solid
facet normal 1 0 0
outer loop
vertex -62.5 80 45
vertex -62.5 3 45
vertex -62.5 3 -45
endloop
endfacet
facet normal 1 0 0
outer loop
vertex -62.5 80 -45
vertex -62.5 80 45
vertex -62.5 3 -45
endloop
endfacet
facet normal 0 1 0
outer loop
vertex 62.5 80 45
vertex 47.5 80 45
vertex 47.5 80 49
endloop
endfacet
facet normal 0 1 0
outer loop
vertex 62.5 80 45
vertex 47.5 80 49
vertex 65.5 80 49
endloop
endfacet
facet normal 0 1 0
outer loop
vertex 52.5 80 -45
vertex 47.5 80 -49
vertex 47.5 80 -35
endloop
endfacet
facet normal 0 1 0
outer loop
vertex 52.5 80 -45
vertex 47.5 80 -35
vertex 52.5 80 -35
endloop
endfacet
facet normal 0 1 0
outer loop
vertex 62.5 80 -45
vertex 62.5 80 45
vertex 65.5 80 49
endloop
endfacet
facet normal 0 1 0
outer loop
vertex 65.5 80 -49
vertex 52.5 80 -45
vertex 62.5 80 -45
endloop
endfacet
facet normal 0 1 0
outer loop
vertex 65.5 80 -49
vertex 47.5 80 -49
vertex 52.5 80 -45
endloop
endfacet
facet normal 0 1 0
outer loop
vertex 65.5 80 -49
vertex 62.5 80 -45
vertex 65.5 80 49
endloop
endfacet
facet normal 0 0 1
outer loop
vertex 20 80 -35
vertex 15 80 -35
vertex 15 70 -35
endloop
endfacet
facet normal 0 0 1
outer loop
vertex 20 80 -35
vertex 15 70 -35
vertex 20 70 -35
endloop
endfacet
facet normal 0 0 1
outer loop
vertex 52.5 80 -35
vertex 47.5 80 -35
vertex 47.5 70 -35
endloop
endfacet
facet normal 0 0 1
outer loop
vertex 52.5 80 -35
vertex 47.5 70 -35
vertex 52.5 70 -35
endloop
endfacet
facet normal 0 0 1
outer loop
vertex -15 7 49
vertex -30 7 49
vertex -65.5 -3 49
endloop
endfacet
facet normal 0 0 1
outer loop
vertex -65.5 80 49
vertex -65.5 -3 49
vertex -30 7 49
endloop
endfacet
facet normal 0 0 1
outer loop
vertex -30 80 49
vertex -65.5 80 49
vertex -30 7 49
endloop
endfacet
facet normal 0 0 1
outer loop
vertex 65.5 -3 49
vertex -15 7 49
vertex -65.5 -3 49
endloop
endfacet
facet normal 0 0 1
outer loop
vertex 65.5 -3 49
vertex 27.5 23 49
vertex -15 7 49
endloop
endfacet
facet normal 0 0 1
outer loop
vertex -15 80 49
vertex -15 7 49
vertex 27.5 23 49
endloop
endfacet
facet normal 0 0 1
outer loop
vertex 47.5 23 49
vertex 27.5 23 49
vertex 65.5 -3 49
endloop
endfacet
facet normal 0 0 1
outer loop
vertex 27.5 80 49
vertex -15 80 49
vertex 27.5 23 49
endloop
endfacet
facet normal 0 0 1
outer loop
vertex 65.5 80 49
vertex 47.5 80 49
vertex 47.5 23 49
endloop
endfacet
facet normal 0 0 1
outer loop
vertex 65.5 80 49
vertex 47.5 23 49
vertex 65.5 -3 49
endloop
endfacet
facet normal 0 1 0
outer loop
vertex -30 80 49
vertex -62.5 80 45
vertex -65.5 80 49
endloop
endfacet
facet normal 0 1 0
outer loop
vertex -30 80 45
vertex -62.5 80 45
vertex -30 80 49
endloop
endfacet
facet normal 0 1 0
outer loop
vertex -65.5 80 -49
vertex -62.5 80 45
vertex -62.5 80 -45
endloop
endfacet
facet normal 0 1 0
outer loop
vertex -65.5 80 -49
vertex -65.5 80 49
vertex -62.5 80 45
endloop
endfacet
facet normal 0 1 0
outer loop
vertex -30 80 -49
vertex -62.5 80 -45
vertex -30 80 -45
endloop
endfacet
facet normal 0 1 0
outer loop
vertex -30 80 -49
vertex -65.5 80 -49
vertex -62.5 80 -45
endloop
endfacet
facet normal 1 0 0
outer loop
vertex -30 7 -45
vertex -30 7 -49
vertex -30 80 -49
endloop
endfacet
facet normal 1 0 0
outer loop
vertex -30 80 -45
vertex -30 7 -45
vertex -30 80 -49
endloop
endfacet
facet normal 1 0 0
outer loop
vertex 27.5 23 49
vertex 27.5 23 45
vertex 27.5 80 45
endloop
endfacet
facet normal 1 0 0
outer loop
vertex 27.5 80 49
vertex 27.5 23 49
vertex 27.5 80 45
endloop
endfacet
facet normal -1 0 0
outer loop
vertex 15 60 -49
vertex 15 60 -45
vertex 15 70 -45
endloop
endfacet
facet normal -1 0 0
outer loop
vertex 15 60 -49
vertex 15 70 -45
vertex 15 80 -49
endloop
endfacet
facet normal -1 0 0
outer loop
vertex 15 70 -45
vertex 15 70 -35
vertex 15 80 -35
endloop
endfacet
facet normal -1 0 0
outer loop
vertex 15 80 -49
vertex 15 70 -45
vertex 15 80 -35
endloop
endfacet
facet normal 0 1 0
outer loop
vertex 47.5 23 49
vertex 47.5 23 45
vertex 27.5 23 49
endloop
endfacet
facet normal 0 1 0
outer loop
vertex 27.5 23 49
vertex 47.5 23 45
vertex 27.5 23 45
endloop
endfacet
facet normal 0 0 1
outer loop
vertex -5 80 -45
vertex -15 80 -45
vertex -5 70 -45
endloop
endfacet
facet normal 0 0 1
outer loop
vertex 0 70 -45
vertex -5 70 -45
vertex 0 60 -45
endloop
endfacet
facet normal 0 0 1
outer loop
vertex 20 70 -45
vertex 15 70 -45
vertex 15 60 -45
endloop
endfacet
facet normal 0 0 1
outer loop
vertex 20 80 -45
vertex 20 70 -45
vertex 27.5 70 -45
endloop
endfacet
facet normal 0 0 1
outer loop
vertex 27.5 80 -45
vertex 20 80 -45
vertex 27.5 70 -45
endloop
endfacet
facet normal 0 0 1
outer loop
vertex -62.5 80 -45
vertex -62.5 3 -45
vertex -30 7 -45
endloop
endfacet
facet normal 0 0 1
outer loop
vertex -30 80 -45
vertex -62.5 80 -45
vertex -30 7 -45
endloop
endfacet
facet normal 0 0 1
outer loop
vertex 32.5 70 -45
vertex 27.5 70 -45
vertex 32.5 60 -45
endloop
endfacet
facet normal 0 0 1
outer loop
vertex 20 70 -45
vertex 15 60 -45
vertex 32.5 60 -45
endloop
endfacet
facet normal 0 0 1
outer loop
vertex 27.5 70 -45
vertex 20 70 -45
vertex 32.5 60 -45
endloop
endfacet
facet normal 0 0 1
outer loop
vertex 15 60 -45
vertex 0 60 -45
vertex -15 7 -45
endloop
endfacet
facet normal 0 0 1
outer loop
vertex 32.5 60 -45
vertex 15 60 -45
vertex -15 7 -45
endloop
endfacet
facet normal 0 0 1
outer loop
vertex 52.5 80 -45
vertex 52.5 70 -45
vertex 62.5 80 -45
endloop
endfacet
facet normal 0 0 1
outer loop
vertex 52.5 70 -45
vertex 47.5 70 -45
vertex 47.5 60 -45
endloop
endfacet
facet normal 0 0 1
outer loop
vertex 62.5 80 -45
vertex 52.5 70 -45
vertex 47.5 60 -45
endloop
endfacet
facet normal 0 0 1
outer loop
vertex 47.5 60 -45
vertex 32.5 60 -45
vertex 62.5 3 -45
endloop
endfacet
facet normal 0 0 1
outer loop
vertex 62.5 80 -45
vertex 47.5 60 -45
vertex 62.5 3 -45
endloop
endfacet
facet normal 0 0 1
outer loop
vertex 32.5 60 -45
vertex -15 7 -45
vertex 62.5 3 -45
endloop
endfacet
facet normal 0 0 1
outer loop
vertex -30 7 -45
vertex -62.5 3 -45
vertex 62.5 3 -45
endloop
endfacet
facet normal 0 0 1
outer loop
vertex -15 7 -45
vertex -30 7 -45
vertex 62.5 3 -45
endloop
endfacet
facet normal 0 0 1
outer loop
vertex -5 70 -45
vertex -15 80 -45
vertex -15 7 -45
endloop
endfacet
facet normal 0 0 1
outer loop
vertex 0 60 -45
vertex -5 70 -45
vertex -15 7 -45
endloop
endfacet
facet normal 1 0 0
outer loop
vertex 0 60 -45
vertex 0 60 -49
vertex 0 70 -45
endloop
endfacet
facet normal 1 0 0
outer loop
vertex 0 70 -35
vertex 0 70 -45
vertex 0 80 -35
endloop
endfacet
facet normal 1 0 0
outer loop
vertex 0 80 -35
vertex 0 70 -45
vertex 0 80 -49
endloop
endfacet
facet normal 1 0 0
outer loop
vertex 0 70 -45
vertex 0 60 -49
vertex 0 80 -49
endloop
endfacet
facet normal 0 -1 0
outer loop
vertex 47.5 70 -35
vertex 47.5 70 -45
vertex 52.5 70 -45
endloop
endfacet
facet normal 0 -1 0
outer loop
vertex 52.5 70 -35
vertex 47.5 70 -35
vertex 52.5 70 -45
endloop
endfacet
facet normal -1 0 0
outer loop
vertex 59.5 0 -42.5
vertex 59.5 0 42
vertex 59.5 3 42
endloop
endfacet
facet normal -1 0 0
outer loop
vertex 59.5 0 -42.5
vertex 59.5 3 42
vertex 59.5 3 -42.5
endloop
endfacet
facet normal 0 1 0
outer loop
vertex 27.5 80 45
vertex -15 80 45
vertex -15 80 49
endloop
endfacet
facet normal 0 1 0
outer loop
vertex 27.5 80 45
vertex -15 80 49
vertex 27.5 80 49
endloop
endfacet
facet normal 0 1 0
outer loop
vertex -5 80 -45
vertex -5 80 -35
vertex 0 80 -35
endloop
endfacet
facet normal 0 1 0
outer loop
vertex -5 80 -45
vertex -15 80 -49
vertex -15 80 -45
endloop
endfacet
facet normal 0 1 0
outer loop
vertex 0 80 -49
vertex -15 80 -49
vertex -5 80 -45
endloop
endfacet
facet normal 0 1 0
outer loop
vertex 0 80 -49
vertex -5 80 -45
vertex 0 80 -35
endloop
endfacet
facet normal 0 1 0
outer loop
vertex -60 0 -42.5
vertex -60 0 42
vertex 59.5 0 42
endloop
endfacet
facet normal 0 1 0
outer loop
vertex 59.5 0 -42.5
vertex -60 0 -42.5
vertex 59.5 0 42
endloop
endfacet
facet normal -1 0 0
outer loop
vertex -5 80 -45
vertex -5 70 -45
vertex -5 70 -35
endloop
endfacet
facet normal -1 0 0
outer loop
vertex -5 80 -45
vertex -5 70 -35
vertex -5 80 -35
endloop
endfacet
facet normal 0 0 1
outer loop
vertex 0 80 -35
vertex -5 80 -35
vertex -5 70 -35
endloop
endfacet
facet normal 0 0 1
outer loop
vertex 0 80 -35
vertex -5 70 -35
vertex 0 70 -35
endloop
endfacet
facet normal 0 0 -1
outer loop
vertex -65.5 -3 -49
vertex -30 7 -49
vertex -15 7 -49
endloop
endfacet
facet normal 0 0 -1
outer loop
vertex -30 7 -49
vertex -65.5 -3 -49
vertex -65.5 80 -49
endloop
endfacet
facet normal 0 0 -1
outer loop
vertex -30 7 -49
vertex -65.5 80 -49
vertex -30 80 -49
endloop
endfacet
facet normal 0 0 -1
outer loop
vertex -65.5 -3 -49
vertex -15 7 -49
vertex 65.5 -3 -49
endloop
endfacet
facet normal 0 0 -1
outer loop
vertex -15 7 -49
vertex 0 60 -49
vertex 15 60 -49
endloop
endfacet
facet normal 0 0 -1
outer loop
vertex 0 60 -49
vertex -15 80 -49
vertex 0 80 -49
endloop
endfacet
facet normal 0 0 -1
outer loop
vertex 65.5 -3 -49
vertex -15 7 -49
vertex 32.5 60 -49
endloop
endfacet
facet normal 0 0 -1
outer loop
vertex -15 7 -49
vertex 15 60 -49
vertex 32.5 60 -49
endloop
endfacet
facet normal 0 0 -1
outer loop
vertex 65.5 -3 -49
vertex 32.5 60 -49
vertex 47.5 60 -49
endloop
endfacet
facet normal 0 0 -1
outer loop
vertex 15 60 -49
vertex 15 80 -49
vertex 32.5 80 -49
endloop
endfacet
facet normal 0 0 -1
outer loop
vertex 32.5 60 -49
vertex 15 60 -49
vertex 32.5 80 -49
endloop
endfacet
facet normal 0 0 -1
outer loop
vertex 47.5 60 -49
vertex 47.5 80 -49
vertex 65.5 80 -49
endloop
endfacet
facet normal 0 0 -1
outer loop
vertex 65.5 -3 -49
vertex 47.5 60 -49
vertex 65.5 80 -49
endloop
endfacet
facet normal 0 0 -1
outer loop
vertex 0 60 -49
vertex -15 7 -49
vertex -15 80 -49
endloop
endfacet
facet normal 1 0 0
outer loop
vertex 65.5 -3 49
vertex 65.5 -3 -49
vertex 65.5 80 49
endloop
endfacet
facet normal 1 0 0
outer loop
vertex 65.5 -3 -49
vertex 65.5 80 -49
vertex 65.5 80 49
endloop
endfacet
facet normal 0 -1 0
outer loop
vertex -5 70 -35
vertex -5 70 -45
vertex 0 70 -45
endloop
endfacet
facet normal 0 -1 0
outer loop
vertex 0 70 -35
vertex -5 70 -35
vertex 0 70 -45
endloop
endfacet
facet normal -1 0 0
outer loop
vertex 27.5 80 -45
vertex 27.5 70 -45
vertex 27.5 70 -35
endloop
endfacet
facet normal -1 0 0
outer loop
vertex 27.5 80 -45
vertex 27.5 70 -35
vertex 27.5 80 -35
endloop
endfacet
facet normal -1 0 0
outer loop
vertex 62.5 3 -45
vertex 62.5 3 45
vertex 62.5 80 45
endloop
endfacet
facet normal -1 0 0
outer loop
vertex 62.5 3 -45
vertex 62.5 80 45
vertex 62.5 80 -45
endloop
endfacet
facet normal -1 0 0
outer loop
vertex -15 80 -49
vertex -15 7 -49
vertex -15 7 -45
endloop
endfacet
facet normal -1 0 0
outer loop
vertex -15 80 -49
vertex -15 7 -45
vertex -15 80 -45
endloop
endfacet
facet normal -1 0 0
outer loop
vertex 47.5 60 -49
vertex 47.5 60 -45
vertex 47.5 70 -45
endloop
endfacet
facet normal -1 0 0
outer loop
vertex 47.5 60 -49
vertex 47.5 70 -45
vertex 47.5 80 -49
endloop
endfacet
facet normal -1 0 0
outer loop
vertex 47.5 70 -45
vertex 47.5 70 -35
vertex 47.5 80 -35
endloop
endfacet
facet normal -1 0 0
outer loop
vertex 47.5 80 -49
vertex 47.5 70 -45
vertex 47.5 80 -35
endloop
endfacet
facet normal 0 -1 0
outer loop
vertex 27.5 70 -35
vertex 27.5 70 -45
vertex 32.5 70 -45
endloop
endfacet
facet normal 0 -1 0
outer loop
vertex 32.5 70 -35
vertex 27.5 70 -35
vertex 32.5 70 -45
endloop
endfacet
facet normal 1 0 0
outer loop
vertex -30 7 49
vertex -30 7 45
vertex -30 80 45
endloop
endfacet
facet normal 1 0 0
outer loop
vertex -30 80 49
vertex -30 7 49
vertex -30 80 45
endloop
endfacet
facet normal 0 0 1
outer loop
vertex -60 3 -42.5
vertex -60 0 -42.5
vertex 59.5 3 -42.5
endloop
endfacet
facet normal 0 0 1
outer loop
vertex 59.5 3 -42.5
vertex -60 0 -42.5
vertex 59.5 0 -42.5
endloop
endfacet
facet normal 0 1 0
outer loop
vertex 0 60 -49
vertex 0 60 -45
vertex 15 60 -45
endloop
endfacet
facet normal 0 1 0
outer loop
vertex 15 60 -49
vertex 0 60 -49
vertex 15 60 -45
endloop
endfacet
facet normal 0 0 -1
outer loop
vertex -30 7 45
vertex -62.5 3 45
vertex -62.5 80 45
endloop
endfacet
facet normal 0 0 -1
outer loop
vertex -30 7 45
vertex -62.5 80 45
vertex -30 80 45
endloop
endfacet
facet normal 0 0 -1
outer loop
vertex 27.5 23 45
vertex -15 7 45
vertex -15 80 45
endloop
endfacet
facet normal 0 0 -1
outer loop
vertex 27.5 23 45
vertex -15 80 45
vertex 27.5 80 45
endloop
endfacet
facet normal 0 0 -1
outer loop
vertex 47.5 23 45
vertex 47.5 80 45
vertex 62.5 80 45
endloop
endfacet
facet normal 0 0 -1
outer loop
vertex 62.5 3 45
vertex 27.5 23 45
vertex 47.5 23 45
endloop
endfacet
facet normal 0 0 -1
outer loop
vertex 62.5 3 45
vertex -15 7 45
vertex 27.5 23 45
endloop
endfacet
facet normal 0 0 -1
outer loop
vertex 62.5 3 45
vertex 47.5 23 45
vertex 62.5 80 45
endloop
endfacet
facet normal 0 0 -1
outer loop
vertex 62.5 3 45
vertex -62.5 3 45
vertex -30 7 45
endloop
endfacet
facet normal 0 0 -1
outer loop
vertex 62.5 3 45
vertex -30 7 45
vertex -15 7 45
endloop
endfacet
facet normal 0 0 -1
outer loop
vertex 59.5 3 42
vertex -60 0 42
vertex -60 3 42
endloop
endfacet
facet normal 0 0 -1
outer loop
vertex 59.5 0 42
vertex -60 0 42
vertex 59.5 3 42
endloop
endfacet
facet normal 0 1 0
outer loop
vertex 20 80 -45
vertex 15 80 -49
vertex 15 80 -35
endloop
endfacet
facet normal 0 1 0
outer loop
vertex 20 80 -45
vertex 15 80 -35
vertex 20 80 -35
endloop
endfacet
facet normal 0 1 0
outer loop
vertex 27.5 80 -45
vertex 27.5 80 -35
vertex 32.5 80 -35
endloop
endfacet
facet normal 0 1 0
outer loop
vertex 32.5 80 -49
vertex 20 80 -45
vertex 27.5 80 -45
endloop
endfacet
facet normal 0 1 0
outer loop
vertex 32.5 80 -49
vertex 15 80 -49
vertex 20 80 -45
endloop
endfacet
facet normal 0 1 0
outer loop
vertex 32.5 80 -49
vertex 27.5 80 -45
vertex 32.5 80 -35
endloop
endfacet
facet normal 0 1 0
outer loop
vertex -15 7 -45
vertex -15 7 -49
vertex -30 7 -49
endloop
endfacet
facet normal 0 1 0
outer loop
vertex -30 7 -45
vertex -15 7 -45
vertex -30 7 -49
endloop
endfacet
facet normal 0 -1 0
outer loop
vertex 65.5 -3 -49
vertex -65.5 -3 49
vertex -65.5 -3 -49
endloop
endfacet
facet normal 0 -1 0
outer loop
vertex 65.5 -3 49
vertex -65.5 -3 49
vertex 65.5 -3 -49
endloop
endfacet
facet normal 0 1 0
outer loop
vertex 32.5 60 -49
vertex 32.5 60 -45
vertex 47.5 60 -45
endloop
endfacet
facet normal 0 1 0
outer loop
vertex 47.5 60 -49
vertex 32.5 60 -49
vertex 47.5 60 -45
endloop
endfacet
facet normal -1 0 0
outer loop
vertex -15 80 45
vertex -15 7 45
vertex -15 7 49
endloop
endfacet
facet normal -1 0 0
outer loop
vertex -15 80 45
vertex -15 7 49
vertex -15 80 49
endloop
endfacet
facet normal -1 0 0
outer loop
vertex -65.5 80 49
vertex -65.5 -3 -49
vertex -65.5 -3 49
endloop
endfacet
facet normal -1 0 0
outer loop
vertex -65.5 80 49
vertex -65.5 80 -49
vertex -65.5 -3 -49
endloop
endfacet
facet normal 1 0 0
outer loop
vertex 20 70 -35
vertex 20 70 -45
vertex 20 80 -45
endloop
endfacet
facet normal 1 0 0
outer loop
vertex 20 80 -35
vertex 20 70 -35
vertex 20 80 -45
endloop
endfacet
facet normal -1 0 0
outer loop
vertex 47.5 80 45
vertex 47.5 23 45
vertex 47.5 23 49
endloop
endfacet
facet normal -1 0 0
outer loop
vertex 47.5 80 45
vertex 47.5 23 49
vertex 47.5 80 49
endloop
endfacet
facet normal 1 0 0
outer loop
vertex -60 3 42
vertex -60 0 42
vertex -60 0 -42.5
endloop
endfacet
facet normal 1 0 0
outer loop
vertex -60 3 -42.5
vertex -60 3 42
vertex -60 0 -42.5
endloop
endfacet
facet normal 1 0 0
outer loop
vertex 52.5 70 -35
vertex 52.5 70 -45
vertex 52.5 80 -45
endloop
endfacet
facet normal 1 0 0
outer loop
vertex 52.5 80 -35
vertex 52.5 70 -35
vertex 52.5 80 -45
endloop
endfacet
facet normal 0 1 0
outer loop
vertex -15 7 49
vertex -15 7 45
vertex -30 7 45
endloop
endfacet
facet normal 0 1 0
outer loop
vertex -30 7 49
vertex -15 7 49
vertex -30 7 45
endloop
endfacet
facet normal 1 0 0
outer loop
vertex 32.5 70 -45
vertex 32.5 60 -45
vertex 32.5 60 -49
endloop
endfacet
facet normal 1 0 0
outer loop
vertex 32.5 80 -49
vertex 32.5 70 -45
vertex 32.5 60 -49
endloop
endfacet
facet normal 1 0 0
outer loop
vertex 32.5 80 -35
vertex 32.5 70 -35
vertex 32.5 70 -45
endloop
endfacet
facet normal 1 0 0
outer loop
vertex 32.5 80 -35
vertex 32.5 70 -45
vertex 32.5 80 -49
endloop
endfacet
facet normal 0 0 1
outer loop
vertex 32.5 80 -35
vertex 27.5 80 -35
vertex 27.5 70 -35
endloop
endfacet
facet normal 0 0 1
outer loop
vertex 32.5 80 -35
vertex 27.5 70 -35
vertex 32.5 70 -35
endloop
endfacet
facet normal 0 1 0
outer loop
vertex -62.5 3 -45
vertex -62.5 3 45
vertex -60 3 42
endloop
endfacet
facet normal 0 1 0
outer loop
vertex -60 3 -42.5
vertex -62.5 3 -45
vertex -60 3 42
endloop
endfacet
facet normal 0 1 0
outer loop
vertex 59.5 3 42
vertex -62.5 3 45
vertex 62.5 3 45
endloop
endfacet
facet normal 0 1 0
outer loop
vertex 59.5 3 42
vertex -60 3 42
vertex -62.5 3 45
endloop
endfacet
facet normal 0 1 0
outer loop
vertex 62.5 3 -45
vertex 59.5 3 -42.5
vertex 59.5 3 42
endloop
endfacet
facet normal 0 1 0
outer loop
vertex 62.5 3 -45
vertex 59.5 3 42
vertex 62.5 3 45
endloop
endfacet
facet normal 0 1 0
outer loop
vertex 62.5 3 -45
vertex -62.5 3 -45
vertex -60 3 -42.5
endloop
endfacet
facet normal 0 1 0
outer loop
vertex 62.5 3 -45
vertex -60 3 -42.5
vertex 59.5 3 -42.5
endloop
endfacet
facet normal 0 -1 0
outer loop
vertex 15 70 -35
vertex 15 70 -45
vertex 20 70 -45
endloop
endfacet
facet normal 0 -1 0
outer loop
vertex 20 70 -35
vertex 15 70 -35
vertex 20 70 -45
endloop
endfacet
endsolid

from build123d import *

# Parameters (mm, degrees)
SKETCH1_W           = 131
SKETCH1_H           = 98
SKETCH1_W_2         = 125
SKETCH1_H_2         = 90
BOSS_EXTRUDE1_DEPTH = 80
SKETCH2_W           = 131
SKETCH2_H           = 98
BOSS_EXTRUDE2_DEPTH = 3
SKETCH4_W           = 125
SKETCH4_H           = 90
SKETCH4_W_2         = 119.5
SKETCH4_H_2         = 84.5
BOSS_EXTRUDE3_DEPTH = 3
SKETCH5_W           = 15
SKETCH5_H           = 73
CUT_EXTRUDE1_DEPTH  = 143.457888514
CUT_EXTRUDE2_REACH  = 141.736
SKETCH6_W           = 20
SKETCH6_H           = 57
CUT_EXTRUDE3_REACH  = 141.736
SKETCH7_W           = 15
SKETCH7_H           = 20
SKETCH8_W           = 5
SKETCH8_H           = 10
BOSS_EXTRUDE4_DEPTH = 10


with BuildPart() as part:
    # Sketch1 → Boss-Extrude1 (new body)
    with BuildSketch(Plane(origin=(0, 0, 0), x_dir=(1, 0, 0), z_dir=(0, 1, 0))):
        Rectangle(SKETCH1_W, SKETCH1_H)
        Rectangle(SKETCH1_W_2, SKETCH1_H_2, mode=Mode.SUBTRACT)
    extrude(amount=BOSS_EXTRUDE1_DEPTH)

    # Sketch2 → Boss-Extrude2 (add)
    with BuildSketch(Plane.XZ):
        Rectangle(SKETCH2_W, SKETCH2_H)
    extrude(amount=BOSS_EXTRUDE2_DEPTH)

    # Sketch4 → Boss-Extrude3 (add)
    with BuildSketch(Plane(origin=(0, 0, 0), x_dir=(1, 0, 0), z_dir=(0, 1, 0))):
        Rectangle(SKETCH4_W, SKETCH4_H)
        with Locations((-0.25, 0.25)):
            Rectangle(SKETCH4_W_2, SKETCH4_H_2, mode=Mode.SUBTRACT)
    extrude(amount=BOSS_EXTRUDE3_DEPTH)

    # Sketch5 → Cut-Extrude1 (cut, through all)
    with BuildSketch(Plane(origin=(0, 0, -49), x_dir=(-1, 0, 0), z_dir=(0, 0, -1))):
        with Locations((22.5, 43.5)):
            Rectangle(SKETCH5_W, SKETCH5_H)
    extrude(amount=-CUT_EXTRUDE1_DEPTH, mode=Mode.SUBTRACT)

    # Sketch6 → Cut-Extrude2 (cut, up to next)
    with BuildSketch(Plane(origin=(0, 0, 45), x_dir=(-1, 0, 0), z_dir=(0, 0, -1)), mode=Mode.PRIVATE) as cut_extrude2_sk1:
        with Locations((-37.5, 51.5)):
            Rectangle(SKETCH6_W, SKETCH6_H)
    cut_extrude2_tool1 = extrude(cut_extrude2_sk1.sketch, amount=-CUT_EXTRUDE2_REACH, mode=Mode.PRIVATE) & part.part
    add(cut_extrude2_tool1.solids().sort_by_distance((37.5, 51.5, 45))[0], mode=Mode.SUBTRACT)

    # Sketch7 → Cut-Extrude3 (cut, up to next)
    with BuildSketch(Plane.XY.offset(-45), mode=Mode.PRIVATE) as cut_extrude3_sk1:
        with Locations((40, 70)):
            Rectangle(SKETCH7_W, SKETCH7_H)
    cut_extrude3_tool1 = extrude(cut_extrude3_sk1.sketch, amount=-CUT_EXTRUDE3_REACH, mode=Mode.PRIVATE) & part.part
    # Sketch7 → Cut-Extrude3 (cut, up to next)
    with BuildSketch(Plane.XY.offset(-45), mode=Mode.PRIVATE) as cut_extrude3_sk2:
        with Locations((7.5, 70)):
            Rectangle(SKETCH7_W, SKETCH7_H)
    cut_extrude3_tool2 = extrude(cut_extrude3_sk2.sketch, amount=-CUT_EXTRUDE3_REACH, mode=Mode.PRIVATE) & part.part
    add(cut_extrude3_tool1.solids().sort_by_distance((40, 70, -45))[0], mode=Mode.SUBTRACT)
    add(cut_extrude3_tool2.solids().sort_by_distance((7.5, 70, -45))[0], mode=Mode.SUBTRACT)

    # Sketch8 → Boss-Extrude4 (add)
    with BuildSketch(Plane.XY.offset(-45)):
        with Locations((-2.5, 75)):
            Rectangle(SKETCH8_W, SKETCH8_H)
        with Locations((17.5, 75)):
            Rectangle(SKETCH8_W, SKETCH8_H)
        with Locations((30, 75)):
            Rectangle(SKETCH8_W, SKETCH8_H)
        with Locations((50, 75)):
            Rectangle(SKETCH8_W, SKETCH8_H)
    extrude(amount=BOSS_EXTRUDE4_DEPTH)


solid = part.part
